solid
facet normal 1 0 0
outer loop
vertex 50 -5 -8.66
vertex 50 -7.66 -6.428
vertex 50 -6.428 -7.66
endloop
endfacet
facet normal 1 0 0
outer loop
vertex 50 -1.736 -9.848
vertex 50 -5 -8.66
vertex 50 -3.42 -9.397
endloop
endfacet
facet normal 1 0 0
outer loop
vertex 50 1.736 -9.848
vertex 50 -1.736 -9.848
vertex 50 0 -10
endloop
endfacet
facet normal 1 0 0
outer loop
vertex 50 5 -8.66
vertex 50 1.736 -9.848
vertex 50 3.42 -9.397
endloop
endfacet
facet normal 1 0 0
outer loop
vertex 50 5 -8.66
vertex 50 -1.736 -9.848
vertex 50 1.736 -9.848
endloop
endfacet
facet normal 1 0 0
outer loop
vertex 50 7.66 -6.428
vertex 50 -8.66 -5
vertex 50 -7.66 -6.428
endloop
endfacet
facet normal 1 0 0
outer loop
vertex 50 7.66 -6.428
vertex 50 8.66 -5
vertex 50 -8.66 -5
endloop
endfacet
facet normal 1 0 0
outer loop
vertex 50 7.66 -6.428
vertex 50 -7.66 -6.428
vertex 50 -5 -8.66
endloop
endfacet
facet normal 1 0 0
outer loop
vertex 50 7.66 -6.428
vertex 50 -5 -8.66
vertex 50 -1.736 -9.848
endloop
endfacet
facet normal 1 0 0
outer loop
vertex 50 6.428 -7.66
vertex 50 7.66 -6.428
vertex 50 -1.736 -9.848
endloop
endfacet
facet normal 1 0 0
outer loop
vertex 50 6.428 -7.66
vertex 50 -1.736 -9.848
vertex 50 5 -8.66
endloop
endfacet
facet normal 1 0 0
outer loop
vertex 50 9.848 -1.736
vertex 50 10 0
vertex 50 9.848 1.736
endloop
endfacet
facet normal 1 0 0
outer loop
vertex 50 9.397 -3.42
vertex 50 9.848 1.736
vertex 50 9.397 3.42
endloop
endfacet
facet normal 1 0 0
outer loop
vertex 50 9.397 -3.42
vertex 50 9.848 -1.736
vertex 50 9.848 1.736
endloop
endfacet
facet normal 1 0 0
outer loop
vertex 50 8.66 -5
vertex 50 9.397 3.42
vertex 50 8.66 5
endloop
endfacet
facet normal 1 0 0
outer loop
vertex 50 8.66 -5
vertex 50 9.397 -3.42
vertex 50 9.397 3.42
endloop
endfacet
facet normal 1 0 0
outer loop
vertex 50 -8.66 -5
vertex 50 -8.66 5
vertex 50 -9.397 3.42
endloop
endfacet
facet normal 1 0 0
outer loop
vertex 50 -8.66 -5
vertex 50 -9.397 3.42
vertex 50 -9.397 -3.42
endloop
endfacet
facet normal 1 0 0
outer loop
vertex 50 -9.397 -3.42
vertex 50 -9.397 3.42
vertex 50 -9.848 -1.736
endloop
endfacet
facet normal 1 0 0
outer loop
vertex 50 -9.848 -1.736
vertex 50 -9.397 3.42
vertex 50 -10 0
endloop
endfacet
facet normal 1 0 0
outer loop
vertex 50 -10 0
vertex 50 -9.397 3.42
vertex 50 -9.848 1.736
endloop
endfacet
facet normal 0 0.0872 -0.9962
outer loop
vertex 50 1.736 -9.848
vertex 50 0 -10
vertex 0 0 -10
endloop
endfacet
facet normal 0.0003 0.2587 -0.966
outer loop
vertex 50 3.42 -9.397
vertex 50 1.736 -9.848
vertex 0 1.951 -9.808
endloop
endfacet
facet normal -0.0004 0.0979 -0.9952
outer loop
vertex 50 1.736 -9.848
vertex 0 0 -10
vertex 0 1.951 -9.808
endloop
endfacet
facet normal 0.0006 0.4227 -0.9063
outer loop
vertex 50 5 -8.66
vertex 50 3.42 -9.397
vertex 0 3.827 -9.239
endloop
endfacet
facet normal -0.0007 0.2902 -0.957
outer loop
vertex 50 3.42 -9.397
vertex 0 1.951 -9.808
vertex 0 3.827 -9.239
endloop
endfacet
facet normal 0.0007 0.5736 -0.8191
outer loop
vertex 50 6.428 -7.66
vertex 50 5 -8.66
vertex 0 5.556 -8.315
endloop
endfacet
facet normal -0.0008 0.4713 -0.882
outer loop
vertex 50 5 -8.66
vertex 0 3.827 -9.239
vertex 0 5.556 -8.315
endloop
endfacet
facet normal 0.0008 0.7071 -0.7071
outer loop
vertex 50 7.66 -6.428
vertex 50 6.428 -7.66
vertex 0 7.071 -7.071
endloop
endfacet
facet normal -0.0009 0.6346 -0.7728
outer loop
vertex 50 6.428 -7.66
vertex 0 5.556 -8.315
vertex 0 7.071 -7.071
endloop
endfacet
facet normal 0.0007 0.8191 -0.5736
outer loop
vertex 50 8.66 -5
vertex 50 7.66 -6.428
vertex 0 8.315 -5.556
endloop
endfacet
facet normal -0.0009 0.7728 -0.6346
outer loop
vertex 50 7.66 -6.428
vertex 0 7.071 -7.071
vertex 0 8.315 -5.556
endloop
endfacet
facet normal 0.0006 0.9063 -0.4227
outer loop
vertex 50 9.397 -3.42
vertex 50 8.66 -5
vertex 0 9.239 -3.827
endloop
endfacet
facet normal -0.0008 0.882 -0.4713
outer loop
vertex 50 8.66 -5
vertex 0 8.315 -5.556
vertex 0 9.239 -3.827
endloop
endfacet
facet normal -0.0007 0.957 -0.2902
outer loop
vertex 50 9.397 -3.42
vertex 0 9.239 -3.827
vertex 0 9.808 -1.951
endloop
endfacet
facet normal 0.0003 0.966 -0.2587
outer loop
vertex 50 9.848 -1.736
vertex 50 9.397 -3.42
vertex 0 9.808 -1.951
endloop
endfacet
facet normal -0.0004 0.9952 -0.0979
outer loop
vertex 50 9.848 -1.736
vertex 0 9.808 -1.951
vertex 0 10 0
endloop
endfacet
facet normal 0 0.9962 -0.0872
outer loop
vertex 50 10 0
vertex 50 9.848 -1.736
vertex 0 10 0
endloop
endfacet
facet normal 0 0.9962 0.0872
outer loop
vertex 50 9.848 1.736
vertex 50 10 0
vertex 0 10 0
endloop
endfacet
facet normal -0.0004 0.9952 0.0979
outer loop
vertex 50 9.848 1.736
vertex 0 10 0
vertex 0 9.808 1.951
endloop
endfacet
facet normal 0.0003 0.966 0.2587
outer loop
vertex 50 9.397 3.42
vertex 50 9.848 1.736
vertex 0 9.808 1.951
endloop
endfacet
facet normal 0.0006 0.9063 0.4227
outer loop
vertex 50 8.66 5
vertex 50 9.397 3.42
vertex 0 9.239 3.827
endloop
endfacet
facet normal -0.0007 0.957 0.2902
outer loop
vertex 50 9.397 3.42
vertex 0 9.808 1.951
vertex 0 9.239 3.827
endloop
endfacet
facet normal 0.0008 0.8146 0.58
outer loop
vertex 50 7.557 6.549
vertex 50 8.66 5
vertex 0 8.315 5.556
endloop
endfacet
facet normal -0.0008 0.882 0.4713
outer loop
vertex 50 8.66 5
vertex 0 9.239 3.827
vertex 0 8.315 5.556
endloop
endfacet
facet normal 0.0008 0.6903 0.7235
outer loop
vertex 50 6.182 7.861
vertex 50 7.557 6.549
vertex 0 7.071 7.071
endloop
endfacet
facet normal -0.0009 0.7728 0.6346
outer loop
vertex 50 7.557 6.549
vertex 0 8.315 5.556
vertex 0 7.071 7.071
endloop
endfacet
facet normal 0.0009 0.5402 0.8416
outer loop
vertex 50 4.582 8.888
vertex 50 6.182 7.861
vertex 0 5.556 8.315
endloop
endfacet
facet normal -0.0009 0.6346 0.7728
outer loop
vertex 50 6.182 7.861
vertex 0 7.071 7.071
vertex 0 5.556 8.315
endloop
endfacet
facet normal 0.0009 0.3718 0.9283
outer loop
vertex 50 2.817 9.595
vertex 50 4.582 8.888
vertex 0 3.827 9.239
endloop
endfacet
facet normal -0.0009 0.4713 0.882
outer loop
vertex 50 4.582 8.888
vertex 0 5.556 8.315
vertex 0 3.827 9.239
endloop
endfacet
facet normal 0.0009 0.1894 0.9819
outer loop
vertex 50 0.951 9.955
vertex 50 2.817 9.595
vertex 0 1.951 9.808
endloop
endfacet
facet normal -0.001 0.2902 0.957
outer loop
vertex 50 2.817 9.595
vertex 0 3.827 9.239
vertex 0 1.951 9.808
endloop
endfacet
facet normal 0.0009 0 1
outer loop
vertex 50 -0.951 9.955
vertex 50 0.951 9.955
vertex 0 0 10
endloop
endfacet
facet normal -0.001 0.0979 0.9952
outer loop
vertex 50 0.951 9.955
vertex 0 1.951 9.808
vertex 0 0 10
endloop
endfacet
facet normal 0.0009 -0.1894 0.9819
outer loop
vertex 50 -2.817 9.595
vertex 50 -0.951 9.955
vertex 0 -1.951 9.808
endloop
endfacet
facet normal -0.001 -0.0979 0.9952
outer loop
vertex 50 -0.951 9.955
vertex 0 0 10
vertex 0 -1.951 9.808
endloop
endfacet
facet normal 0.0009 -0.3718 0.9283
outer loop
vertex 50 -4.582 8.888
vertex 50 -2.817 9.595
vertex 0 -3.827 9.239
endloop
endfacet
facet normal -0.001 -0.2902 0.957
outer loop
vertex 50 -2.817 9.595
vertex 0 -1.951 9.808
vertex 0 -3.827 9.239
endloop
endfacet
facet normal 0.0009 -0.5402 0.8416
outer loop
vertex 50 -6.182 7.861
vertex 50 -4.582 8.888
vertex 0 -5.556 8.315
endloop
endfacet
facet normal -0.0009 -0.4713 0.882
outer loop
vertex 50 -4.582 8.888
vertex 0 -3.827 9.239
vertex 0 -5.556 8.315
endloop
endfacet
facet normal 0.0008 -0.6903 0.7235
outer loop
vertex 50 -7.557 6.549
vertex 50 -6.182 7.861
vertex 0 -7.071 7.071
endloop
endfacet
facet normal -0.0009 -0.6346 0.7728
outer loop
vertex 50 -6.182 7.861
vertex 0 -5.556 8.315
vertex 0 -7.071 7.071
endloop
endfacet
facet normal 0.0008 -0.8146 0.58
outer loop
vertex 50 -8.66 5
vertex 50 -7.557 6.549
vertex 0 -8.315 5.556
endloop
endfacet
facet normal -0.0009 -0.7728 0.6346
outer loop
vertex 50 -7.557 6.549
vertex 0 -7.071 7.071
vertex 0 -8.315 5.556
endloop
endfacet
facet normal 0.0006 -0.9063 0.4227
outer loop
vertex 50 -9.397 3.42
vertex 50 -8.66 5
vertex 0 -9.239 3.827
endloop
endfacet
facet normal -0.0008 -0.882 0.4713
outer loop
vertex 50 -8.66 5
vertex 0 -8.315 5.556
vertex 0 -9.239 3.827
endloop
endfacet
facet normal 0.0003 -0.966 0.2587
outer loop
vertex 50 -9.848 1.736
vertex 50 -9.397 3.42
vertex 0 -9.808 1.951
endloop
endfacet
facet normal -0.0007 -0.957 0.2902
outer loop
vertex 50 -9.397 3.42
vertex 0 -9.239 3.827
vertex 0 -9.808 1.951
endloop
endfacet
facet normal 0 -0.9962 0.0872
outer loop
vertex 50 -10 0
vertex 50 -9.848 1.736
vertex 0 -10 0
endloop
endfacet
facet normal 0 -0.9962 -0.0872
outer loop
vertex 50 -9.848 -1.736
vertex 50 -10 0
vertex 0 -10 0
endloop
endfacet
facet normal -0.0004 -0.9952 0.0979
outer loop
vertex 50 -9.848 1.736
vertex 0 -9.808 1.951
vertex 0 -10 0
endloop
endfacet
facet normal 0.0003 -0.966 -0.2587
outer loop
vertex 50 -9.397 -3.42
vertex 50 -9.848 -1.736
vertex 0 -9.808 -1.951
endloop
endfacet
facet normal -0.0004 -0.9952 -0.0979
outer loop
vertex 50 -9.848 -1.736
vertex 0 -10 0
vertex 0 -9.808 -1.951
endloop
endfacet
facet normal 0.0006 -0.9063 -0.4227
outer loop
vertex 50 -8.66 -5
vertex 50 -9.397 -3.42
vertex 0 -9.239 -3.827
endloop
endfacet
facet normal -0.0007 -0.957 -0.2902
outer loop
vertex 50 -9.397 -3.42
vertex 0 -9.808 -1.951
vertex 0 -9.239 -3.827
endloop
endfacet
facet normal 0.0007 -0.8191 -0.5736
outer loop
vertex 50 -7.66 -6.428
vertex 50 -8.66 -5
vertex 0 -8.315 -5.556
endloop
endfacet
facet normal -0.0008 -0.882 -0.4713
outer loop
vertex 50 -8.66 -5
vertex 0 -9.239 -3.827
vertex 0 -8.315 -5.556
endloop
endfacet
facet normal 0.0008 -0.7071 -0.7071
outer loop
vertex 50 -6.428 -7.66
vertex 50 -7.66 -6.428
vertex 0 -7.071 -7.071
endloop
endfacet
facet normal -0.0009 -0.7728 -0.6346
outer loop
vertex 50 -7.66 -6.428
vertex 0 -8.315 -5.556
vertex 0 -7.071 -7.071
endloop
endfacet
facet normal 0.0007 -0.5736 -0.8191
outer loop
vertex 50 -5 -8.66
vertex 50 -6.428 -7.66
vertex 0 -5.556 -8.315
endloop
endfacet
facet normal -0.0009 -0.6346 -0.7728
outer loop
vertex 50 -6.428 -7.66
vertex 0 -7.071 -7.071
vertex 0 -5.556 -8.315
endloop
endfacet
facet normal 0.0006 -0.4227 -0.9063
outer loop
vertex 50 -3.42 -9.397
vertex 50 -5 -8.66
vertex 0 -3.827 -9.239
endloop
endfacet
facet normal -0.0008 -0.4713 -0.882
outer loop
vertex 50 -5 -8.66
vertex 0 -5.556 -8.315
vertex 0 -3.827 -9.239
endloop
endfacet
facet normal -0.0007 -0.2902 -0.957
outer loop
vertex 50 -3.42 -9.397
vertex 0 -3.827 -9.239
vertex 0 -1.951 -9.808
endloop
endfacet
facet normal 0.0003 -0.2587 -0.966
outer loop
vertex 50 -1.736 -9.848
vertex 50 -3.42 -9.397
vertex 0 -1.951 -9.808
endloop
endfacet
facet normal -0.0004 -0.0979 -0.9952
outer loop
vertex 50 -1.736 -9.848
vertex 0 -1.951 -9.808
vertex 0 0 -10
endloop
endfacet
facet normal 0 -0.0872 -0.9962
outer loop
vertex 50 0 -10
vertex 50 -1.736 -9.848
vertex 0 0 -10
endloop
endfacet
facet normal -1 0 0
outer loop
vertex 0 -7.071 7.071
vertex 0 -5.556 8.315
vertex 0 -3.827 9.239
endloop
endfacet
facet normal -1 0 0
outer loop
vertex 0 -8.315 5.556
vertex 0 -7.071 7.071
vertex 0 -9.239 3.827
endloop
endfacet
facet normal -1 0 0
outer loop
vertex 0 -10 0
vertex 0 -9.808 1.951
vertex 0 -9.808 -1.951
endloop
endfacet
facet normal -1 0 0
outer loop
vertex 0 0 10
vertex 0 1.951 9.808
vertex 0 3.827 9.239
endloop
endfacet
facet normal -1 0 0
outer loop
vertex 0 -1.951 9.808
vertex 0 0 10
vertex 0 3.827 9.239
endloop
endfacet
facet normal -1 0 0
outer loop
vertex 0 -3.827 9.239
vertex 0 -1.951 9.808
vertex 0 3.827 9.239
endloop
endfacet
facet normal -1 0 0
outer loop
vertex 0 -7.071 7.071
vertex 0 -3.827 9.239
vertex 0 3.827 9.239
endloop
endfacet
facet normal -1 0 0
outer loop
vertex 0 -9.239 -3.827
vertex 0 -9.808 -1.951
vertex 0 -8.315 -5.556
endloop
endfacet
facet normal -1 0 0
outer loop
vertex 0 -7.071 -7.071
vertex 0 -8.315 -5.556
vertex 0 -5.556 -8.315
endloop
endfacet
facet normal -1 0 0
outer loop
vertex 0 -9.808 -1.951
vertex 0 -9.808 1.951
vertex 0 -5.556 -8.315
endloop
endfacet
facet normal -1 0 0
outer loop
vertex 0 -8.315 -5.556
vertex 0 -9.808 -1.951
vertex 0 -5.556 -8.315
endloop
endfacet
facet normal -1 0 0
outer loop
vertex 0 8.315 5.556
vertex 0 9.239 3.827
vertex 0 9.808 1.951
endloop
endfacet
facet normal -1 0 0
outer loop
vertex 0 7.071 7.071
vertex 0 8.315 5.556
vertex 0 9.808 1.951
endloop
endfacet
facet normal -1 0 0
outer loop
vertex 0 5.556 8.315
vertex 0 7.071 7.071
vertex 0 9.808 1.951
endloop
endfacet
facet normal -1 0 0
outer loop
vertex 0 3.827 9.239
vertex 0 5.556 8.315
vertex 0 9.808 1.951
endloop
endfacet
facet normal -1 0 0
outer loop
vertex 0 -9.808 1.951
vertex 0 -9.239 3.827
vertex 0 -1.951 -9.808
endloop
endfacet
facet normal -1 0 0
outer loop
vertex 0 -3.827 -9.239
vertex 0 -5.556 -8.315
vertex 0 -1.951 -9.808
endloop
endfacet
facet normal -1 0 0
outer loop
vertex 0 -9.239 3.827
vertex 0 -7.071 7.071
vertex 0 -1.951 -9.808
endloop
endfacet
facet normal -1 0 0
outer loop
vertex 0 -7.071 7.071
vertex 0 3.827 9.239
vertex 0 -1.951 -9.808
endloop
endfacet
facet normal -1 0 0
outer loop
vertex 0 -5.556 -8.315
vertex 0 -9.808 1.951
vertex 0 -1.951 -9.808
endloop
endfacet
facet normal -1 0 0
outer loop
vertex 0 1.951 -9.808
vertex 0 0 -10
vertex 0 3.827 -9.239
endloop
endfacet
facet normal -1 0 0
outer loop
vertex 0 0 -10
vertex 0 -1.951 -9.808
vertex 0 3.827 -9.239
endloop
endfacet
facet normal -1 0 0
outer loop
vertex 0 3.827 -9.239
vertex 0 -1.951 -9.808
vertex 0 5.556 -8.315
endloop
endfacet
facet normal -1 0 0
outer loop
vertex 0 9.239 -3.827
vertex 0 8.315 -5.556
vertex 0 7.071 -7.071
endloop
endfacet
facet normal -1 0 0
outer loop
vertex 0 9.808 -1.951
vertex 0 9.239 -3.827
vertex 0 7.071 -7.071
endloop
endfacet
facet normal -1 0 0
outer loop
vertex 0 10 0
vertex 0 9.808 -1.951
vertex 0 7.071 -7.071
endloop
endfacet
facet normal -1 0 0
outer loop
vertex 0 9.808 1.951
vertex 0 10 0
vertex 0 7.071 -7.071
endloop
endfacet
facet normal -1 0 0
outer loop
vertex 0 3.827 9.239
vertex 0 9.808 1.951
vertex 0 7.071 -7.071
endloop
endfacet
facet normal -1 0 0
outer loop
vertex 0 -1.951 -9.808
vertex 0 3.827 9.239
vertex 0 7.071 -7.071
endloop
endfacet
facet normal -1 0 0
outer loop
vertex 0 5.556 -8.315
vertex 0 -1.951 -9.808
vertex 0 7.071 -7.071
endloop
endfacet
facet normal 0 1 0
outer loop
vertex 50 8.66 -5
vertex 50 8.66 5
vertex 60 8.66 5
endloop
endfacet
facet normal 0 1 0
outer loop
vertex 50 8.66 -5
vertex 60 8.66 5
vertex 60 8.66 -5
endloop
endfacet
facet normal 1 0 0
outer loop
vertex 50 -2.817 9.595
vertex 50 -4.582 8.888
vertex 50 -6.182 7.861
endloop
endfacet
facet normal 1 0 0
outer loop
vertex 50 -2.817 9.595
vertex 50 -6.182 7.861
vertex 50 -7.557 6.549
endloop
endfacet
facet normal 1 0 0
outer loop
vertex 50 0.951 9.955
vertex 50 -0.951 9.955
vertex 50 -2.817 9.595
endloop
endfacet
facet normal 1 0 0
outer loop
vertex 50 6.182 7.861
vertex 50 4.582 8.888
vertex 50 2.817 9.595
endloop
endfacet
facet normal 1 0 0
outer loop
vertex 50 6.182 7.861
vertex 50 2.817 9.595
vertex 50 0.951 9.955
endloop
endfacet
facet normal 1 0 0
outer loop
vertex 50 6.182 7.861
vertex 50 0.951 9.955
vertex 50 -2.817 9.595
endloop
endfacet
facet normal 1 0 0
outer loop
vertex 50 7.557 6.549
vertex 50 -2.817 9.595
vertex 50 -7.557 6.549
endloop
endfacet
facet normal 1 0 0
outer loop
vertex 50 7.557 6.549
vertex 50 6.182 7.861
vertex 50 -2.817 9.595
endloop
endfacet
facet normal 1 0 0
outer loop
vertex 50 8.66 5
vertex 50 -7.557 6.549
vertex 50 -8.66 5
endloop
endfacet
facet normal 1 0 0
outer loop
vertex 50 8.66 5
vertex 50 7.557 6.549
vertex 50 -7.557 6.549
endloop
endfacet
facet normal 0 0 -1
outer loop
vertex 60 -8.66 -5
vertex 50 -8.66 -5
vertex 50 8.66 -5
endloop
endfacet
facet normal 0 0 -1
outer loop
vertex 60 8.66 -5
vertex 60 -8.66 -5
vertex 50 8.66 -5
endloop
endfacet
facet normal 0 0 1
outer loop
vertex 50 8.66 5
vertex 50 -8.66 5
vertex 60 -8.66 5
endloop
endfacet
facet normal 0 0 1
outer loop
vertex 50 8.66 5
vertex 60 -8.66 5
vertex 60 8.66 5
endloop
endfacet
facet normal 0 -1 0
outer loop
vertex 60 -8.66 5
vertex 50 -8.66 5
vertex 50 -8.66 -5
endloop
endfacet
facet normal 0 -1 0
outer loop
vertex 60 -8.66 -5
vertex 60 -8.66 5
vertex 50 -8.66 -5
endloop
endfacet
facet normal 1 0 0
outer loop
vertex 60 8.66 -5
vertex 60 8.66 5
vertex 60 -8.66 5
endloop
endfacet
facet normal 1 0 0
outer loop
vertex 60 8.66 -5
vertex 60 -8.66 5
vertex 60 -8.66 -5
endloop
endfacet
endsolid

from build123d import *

# Parameters (mm, degrees)
SKETCH_1_R          = 30
EXTRUDE_1_DEPTH     = 10
CUT_EXTRUDE_START   = -10
SKETCH_2_R          = 30
SKETCH_2_R_2        = 10
CUT_EXTRUDE_1_DEPTH = 10
SKETCH_4_R          = 10
EXTRUDE_2_DEPTH     = 40
SKETCH_5_W          = 10
SKETCH_5_H          = 17.320508076
EXTRUDE_3_DEPTH     = 10


with BuildPart() as part:
    # 草图1 → 凸台-拉伸1 (new body)
    with BuildSketch(Plane(origin=(0, 0, 0), x_dir=(0, 0, -1), z_dir=(1, 0, 0))):
        Circle(SKETCH_1_R)
    extrude(amount=EXTRUDE_1_DEPTH)

    # 草图2 → 切除-拉伸1 (cut)
    with BuildSketch(Plane(origin=(10, 0, 0), x_dir=(0, 0, -1), z_dir=(1, 0, 0)).offset(CUT_EXTRUDE_START)):
        Circle(SKETCH_2_R)
        Circle(SKETCH_2_R_2, mode=Mode.SUBTRACT)
    extrude(amount=CUT_EXTRUDE_1_DEPTH, mode=Mode.SUBTRACT)

    # 草图4 → 凸台-拉伸2 (add)
    with BuildSketch(Plane(origin=(10, 0, 0), x_dir=(0, 0, -1), z_dir=(1, 0, 0))):
        Circle(SKETCH_4_R)
    extrude(amount=EXTRUDE_2_DEPTH)

    # 草图5 → 凸台-拉伸3 (add)
    with BuildSketch(Plane(origin=(50, 0, 0), x_dir=(0, 0, -1), z_dir=(1, 0, 0))):
        Rectangle(SKETCH_5_W, SKETCH_5_H)
    extrude(amount=EXTRUDE_3_DEPTH)


solid = part.part
